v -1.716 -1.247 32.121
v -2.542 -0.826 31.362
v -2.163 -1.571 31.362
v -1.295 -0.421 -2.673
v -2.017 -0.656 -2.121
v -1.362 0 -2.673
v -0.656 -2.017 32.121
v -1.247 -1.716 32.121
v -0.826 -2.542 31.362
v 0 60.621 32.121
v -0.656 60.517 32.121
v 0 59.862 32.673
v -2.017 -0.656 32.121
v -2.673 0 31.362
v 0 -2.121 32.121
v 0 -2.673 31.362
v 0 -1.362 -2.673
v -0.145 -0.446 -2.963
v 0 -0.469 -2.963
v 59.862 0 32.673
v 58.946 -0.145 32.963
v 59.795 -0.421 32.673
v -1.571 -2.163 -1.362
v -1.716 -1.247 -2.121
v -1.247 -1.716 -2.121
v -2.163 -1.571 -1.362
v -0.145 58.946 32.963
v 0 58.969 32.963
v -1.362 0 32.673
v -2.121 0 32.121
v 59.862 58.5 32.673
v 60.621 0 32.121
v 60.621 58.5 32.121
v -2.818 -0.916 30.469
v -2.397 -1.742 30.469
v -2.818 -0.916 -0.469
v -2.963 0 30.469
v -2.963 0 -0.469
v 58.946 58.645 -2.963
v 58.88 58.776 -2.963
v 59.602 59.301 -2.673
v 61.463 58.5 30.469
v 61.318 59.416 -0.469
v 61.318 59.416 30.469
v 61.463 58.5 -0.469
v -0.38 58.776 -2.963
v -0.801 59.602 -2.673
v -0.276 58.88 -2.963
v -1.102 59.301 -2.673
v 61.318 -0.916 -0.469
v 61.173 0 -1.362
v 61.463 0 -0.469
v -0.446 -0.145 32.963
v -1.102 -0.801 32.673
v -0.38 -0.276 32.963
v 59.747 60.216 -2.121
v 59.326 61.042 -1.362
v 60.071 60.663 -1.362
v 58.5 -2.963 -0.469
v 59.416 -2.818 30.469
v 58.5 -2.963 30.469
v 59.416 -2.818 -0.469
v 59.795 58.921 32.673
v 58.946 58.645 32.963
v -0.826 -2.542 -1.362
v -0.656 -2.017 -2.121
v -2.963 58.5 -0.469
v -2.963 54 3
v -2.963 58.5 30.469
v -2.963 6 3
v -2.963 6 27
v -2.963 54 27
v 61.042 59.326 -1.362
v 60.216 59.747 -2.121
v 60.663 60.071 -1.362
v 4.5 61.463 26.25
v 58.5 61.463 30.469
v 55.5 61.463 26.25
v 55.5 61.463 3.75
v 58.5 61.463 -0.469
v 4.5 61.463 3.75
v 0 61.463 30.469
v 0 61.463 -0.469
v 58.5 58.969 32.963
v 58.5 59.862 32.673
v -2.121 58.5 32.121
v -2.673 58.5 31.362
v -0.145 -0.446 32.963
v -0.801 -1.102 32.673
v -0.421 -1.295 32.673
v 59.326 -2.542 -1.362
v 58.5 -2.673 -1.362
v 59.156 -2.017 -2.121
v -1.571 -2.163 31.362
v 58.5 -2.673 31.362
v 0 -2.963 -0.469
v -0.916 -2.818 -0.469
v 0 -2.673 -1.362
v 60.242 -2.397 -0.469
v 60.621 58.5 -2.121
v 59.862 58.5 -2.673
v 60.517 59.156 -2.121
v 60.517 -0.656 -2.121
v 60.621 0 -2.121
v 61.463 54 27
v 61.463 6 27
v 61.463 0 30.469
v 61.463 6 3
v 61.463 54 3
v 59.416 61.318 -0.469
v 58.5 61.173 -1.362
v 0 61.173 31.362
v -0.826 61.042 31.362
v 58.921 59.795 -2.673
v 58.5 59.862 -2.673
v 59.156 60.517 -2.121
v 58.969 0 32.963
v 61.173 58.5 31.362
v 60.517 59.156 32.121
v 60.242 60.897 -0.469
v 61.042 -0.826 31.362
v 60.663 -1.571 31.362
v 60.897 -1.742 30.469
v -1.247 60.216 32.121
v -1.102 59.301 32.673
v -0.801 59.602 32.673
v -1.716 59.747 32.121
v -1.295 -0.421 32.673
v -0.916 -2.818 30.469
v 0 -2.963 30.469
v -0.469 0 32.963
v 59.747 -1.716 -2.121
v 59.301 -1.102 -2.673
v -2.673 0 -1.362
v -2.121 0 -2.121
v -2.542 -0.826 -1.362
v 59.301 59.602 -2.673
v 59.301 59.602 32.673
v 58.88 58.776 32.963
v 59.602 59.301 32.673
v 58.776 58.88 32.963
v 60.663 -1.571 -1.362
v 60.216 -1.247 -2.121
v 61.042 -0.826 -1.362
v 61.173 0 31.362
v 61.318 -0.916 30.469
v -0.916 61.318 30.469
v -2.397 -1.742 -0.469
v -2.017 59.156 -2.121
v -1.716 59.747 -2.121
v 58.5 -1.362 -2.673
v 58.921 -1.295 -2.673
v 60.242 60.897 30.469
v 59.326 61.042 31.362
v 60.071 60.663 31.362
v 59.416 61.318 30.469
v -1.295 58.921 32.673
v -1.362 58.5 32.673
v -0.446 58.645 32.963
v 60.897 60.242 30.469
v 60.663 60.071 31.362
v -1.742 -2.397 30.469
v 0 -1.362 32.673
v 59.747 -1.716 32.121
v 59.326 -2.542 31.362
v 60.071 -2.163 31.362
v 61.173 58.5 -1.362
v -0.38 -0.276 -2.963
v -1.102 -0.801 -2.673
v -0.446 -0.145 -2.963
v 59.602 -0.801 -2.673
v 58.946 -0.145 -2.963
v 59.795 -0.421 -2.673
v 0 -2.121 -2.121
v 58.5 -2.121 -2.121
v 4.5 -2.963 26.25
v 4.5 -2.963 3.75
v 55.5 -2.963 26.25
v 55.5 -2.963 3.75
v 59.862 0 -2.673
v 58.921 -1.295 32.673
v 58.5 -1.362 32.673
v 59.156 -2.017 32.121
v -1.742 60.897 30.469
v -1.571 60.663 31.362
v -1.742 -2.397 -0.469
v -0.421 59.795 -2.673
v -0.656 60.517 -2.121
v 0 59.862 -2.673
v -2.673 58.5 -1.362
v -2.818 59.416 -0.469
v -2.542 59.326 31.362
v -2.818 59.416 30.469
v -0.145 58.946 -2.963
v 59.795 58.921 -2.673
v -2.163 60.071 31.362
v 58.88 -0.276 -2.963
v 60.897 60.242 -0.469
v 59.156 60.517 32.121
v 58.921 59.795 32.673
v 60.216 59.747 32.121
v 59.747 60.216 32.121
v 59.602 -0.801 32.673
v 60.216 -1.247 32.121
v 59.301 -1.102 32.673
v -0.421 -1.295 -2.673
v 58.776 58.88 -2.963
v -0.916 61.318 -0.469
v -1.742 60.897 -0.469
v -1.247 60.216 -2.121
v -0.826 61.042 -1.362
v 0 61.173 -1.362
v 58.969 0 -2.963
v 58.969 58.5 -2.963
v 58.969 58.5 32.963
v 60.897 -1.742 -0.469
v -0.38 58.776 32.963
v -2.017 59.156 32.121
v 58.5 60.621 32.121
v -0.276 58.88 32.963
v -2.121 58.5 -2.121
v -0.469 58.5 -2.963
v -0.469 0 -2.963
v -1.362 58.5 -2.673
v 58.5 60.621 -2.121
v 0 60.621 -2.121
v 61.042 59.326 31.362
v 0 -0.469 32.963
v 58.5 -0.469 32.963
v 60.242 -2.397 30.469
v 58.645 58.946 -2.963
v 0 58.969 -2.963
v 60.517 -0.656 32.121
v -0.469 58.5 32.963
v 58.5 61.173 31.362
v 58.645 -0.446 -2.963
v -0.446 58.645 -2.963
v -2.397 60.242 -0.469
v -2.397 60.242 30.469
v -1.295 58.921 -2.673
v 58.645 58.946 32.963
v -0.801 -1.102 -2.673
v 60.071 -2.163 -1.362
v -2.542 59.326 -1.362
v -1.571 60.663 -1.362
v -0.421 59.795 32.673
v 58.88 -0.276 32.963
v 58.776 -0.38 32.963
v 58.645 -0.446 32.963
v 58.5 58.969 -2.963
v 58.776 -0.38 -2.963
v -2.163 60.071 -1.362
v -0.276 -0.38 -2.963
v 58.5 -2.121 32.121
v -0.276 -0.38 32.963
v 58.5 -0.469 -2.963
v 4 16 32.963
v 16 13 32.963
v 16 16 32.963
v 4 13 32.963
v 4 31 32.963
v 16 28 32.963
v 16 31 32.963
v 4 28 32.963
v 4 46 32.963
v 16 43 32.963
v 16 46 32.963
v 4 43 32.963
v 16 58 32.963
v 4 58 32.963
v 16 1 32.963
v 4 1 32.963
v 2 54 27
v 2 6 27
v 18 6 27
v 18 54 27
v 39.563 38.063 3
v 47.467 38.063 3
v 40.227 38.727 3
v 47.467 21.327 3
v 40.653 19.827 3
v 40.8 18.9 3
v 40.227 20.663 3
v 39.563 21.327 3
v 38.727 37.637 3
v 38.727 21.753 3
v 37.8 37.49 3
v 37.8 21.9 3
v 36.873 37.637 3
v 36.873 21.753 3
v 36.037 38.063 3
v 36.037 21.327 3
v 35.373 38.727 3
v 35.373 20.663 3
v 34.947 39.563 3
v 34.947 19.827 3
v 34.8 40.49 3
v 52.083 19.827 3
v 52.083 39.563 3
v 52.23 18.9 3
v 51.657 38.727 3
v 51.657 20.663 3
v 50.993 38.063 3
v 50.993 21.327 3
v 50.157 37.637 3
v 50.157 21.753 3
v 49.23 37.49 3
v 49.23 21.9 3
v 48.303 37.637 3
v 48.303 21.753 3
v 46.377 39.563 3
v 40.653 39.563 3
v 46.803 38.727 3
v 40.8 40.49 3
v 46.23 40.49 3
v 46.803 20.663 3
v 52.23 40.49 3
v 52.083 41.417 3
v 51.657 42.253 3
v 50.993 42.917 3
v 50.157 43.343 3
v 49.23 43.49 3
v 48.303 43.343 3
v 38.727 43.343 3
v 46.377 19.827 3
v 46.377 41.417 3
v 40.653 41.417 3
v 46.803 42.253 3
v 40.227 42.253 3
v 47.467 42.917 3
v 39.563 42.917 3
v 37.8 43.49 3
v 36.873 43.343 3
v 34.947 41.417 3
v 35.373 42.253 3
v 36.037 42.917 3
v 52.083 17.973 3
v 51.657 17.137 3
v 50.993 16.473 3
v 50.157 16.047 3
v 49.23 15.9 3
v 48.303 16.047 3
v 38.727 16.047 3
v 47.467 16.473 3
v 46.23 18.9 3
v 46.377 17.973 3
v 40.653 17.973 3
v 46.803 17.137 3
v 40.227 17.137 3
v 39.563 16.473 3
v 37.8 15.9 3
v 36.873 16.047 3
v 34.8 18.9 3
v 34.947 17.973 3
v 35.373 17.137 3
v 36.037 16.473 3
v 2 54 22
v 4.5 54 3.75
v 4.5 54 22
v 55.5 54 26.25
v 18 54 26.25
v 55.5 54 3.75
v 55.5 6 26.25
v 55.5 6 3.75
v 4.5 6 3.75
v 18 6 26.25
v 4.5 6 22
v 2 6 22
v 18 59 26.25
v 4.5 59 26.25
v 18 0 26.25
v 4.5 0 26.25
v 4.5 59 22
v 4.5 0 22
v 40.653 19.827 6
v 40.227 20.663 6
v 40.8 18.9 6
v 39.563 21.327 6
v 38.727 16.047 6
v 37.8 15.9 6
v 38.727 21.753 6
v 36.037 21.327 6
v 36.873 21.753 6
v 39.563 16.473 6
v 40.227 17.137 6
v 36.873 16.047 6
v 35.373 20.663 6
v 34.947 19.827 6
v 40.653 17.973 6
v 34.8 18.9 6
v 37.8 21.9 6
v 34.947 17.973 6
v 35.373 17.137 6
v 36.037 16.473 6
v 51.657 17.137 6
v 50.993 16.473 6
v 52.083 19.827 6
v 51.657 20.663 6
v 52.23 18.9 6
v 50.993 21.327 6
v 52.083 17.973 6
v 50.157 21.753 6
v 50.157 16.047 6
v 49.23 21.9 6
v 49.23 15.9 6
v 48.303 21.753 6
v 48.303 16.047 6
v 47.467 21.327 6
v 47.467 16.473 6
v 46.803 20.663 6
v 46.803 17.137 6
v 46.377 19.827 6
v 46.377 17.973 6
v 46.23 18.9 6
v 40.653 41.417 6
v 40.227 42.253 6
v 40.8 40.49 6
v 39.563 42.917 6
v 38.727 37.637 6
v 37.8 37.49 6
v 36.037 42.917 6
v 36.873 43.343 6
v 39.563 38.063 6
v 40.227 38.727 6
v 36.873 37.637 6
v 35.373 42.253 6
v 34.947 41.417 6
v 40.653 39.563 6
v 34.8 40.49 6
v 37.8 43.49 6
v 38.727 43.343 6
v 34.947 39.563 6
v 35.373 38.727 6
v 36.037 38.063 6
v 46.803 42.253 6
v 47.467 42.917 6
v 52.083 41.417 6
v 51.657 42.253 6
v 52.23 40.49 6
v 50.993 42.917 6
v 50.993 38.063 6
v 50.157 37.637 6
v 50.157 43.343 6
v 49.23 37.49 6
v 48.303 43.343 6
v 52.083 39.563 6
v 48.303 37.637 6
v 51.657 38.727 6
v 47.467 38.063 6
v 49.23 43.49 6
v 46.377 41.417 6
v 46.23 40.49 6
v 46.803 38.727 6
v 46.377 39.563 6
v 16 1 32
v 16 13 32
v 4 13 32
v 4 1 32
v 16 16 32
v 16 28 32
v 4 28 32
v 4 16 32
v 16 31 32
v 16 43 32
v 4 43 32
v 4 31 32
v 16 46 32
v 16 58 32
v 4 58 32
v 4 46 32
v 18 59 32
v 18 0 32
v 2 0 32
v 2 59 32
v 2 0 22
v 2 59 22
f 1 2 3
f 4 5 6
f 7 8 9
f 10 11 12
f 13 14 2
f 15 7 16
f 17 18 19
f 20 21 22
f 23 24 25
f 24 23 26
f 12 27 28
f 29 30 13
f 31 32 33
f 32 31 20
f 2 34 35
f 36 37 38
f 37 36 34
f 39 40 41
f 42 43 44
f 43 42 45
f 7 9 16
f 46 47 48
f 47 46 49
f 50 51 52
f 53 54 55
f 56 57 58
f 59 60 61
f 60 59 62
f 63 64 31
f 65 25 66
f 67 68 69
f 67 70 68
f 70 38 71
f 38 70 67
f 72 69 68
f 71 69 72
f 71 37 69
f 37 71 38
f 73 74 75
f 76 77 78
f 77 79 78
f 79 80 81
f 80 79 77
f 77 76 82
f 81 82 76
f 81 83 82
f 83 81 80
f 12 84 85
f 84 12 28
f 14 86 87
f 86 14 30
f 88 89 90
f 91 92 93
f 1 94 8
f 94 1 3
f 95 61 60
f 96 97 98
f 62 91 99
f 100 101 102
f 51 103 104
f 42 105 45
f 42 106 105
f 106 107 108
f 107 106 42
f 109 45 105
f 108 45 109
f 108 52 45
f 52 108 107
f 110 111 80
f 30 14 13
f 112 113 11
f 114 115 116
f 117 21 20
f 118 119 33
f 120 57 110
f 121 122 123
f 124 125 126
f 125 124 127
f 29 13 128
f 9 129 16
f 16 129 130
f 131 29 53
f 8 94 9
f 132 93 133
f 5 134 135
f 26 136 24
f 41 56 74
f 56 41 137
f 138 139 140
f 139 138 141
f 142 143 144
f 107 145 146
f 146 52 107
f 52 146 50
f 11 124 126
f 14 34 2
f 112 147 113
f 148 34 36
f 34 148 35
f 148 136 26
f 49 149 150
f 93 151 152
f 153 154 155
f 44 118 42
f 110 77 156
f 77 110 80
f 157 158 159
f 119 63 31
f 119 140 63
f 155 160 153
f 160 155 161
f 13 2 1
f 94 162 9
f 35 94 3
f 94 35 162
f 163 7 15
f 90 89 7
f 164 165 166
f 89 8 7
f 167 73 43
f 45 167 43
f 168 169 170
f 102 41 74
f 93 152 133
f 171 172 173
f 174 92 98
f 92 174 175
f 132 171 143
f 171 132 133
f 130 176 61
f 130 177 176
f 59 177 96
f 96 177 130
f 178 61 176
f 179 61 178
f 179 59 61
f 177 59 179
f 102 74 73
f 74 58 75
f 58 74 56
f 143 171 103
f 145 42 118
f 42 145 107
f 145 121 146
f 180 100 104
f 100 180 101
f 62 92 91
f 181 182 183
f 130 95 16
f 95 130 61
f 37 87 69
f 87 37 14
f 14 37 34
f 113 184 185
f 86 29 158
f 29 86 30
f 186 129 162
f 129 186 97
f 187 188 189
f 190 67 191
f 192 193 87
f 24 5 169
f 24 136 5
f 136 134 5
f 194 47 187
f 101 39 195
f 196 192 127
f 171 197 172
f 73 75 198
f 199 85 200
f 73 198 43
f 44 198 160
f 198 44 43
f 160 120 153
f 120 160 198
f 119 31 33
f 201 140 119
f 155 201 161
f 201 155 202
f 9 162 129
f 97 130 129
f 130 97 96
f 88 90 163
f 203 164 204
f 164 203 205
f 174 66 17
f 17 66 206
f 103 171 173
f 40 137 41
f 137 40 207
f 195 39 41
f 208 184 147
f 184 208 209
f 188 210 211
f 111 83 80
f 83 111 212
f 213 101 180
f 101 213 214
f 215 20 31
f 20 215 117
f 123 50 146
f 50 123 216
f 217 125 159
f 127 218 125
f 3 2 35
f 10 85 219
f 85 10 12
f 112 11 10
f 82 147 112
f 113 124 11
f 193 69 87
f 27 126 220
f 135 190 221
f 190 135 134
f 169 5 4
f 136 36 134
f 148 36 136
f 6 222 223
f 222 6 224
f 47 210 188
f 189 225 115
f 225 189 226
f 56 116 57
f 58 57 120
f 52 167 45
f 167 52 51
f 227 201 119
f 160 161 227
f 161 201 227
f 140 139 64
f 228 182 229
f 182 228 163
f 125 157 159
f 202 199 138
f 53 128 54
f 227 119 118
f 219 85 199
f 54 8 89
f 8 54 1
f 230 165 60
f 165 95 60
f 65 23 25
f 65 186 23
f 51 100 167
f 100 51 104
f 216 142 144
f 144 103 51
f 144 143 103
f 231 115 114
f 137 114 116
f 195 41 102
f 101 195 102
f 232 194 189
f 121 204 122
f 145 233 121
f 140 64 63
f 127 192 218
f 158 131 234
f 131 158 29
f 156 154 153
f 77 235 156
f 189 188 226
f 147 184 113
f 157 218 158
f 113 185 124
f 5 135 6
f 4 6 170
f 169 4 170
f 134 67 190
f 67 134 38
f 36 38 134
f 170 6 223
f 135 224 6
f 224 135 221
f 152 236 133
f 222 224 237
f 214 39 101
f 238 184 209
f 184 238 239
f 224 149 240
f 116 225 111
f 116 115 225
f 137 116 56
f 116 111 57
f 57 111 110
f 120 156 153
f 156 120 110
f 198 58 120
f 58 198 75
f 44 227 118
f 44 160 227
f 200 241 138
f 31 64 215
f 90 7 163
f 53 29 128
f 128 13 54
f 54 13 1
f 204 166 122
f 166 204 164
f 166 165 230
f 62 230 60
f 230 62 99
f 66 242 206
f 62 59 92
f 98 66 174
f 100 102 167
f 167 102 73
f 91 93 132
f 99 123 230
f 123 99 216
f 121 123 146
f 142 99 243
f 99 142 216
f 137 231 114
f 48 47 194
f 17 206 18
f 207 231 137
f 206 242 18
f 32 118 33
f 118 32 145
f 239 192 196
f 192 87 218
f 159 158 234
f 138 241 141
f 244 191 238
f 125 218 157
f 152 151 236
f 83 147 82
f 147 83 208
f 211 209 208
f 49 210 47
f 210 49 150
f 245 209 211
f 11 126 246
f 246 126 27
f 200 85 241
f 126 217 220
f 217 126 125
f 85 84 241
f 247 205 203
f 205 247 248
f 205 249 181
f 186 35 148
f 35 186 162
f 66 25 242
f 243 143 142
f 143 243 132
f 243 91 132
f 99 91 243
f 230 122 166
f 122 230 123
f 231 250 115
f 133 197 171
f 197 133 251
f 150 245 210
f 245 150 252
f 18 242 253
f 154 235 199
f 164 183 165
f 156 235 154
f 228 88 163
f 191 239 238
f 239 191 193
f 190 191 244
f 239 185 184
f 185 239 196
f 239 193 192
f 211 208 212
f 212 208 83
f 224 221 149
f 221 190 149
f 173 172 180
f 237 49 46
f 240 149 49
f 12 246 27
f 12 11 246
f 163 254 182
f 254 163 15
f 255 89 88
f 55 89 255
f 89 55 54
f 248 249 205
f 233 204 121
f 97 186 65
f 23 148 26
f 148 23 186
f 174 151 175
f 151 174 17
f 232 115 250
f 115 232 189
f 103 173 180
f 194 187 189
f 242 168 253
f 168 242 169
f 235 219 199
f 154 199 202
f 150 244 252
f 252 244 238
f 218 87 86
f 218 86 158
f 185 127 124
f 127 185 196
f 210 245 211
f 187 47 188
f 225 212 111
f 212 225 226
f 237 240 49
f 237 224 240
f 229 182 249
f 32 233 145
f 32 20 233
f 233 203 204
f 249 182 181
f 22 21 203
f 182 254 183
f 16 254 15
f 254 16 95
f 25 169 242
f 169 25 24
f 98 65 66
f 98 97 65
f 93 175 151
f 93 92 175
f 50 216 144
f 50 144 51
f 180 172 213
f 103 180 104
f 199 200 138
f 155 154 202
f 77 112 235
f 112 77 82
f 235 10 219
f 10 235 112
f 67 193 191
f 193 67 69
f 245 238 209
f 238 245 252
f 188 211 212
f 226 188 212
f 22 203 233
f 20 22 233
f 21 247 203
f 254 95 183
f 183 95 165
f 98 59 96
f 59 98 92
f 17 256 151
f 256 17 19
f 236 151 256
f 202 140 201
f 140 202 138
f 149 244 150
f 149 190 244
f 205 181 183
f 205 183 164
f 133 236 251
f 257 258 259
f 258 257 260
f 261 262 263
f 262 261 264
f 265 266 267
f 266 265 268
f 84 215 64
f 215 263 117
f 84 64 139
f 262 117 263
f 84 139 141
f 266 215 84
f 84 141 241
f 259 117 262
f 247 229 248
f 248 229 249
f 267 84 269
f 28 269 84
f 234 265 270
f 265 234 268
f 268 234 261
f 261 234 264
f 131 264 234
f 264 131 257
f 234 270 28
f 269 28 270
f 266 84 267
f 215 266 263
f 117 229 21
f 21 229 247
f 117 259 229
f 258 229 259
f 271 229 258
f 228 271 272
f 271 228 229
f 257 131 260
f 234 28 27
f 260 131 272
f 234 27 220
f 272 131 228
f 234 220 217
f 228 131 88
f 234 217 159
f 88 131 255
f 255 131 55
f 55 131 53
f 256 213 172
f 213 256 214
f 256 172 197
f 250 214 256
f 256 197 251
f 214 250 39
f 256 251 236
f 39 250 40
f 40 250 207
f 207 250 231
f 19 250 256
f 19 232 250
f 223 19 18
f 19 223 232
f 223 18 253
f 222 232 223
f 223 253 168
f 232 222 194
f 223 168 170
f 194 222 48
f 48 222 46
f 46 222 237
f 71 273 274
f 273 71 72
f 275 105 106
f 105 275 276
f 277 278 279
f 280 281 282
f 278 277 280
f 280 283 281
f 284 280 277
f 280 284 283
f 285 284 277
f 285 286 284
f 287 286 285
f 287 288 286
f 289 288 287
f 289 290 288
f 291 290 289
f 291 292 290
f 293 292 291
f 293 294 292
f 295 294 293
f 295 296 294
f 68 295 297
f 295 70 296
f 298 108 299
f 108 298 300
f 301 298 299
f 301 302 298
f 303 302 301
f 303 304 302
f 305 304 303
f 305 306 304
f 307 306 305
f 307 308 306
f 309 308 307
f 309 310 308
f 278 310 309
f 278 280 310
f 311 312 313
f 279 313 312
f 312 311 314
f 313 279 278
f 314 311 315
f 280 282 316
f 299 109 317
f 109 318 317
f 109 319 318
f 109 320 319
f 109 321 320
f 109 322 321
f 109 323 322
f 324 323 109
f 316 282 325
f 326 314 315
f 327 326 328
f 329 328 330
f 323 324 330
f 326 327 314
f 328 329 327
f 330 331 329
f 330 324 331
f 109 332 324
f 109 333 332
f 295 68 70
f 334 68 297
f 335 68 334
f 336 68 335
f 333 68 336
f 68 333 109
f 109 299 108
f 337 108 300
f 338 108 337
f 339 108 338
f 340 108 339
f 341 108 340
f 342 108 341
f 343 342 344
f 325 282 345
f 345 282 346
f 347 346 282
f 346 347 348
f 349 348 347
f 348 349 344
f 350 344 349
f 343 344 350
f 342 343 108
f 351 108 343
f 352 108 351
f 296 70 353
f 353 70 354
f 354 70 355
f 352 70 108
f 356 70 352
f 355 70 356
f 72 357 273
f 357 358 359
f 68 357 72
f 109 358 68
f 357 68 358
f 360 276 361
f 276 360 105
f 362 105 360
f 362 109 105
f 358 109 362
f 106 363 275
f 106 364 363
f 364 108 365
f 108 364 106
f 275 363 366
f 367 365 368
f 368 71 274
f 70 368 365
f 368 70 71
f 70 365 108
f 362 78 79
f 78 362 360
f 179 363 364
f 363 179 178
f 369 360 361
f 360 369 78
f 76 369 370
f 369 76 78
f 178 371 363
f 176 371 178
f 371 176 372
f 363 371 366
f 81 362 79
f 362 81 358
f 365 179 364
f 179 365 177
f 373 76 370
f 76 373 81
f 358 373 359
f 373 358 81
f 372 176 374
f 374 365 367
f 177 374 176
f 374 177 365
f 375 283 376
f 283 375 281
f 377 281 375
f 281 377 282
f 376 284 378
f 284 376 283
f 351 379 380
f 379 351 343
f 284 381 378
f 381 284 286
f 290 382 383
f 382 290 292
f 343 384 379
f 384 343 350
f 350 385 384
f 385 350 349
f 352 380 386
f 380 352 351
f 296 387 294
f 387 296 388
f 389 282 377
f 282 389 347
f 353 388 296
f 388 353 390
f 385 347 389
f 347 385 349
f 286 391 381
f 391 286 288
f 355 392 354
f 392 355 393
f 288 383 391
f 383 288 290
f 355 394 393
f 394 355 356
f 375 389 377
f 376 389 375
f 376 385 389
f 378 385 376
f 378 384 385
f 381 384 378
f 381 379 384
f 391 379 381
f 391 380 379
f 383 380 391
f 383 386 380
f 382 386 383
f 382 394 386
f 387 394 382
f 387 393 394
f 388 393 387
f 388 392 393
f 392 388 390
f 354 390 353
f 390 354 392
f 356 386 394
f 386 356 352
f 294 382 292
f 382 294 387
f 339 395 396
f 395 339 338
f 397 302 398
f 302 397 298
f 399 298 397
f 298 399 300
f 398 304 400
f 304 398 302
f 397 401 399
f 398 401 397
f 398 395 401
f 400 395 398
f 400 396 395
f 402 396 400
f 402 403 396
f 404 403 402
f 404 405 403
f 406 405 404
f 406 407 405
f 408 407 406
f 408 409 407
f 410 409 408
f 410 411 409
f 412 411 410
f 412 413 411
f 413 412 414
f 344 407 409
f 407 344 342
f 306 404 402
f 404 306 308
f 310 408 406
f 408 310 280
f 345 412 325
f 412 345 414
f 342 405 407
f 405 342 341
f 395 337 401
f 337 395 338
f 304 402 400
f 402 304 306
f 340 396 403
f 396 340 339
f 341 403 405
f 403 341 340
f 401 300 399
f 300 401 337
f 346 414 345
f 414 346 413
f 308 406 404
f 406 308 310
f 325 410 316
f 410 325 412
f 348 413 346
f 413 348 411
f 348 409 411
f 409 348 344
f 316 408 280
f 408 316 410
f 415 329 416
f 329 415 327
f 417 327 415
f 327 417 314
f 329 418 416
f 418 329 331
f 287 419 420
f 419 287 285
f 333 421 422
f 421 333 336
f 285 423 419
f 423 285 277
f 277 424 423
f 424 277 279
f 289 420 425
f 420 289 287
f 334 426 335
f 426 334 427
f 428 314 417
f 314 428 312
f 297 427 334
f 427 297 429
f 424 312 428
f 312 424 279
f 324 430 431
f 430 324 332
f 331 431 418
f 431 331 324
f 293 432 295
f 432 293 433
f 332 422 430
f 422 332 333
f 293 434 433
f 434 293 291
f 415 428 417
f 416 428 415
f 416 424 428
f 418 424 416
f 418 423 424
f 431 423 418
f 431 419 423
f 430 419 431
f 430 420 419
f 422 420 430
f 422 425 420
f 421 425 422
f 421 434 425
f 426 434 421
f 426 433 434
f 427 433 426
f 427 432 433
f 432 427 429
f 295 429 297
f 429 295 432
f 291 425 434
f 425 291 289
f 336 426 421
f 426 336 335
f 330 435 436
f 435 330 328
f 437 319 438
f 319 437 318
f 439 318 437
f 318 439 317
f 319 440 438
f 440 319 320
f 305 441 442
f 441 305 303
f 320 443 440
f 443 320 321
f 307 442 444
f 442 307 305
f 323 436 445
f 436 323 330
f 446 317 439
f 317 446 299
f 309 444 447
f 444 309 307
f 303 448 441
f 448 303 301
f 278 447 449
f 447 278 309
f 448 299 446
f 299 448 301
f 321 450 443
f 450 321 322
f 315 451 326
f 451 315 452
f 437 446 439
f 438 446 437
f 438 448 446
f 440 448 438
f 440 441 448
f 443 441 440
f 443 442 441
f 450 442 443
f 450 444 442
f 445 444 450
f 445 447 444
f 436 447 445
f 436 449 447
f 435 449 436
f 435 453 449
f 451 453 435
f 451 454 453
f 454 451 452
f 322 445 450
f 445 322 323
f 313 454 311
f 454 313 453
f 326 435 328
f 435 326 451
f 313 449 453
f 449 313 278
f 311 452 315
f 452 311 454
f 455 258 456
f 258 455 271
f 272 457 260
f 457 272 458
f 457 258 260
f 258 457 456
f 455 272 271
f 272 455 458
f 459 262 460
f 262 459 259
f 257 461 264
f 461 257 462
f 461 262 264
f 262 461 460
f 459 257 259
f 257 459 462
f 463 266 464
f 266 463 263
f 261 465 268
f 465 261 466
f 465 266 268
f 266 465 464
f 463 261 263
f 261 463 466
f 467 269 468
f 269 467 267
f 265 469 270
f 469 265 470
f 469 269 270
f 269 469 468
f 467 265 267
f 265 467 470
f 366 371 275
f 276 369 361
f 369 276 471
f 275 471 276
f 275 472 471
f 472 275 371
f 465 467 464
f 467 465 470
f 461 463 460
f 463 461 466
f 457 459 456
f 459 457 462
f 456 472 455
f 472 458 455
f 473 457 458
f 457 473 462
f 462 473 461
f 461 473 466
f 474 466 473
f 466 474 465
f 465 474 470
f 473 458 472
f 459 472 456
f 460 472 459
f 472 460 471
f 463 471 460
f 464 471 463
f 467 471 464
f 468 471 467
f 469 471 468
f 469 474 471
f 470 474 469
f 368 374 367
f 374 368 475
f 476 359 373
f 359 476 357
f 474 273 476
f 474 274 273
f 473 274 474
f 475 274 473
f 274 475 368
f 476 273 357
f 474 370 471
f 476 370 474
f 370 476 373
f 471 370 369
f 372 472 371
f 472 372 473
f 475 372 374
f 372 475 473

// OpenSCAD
// file: ../../../../../../basics/rounded-edges/rounded-cube/rounded-cube.scad
/**
 *
 *  some parts of this software were inspired by
 *
 * 	     http://www.thingiverse.com/thing:9347
 *
 */

/**
 * makes a rounded cube
 */
module roundedCube(cornerRadius=4,
				   cubeCentered=false,
				   sides=30,
				   sidesOnly=false,
				   size=[20,20,2])
{
    $fn=sides;

    x = size[0] - cornerRadius/2;
    y = size[1] - cornerRadius/2;
    z = size[2];

    minkowski(size, cornerRadius)
    {
        cube(size=[x,y,z], center=cubeCentered);

        if(sidesOnly)
        {
            cylinder(r=cornerRadius);
        }
        else
        {
            sphere(r=cornerRadius);
        }
    };
}
// file: ../../../../switch-mounting-holes/keyboard-switch-mounting-holes.scad
/**
 * buttonSide - the length of the side of the rectangular cutout for the button/key
 */
module keyboardSwitchMountingHoles(buttonCount = 4,
			 buttonSide = 5,
		 	 panelHeight = 1)
{
	x = 16;
	startY = 0;

	ySpacing = 3;
	yIncrement = buttonSide + ySpacing;

	for(i = [0 : buttonCount-1])
	{
		y = startY + (i * yIncrement);

		zLength = 2 * panelHeight + 0.2;

		color("green")
		translate([x, y, -0.1])
		cube([buttonSide, buttonSide, zLength]);
	}
}
// file: ../../../../../../microcontrollers/adafruit/trinket-mini/mounting-standoffs/trinket-mini-mounting-standoffs.scad
function xHoleDeltaBottomRight() = 11.43;

function yHoleDelta() = 21.59;

module trinketMiniStandoffs()
{
    radius = 3;
    height = 4;
    sides = 20;
    
    // this is the 'bottom left' standoff; it is on the reset button end of the Trinket Mini
    cylinder(r=radius, h = height, $fn=sides);
    
    // this is the 'bottom right' standoff; it is on the reset button end    
    translate([xHoleDeltaBottomRight(),0,0])
    cylinder(r=radius, h = height, $fn=sides);
    
    // this is the 'top left standoff; it is on the power/USB end of the Trinket Mini    
    translate([0, yHoleDelta(),0])
    cylinder(r=radius, h = height, $fn=sides);
    
    // this is the 'top right standoff; it is on the power/USB end of the Trinket Mini
    translate([xHoleDeltaBottomRight(), yHoleDelta() ,0])
    cylinder(r=radius, h = height, $fn=sides);
}
// file: ../../../../../../basics/rounded-edges/rounded-cube-enclosure/rounded-cube-enclosure.scad
use <../rounded-cube/rounded-cube.scad>

module roundedCubeEnclosure(boardLengthX,
					 		boardLengthY,
					 		boardLengthZ,
							cornerRadius,
							xAxisCutout_yPercentage,
							xAxisCutout_zPercentage,
							yAxisCutout_xPercentage,
							yAxisCutout_zPercentage)
{
	size = [boardLengthX, boardLengthY, boardLengthZ];

	difference()
	{
		roundedCube(cornerRadius = cornerRadius,
					size=size,
		            sides=5,
		            sides=20);

		// x axis cutout
		xAxisCutout_xLength = boardLengthX * 1.2;
		xAxisCutout_yLength = boardLengthY * xAxisCutout_yPercentage;
		xAxisCutout_zLength = boardLengthZ * xAxisCutout_zPercentage;
		xAxisCutout_xTranslate = -0.09 * boardLengthX;
		xAxisCutout_yTranslate = boardLengthY / 2.0 - xAxisCutout_yLength / 2.0;
		xAxisCutout_zTranslate = boardLengthZ / 2.0 - xAxisCutout_zLength / 2.0;
		color("blue")
		translate([xAxisCutout_xTranslate,
				   xAxisCutout_yTranslate,
				   xAxisCutout_zTranslate])
		cube([xAxisCutout_xLength,
			  xAxisCutout_yLength,
			  xAxisCutout_zLength]);

	  	// y axis cutout
		yAxisCutout_xLength = boardLengthX * yAxisCutout_xPercentage;
		yAxisCutout_yLength = boardLengthY * 1.2;
		yAxisCutout_zLength = boardLengthZ * yAxisCutout_zPercentage;
		yAxisCutout_xTranslate = boardLengthX / 2.0 - yAxisCutout_xLength / 2.0;
		yAxisCutout_yTranslate = boardLengthY / 2.0 - yAxisCutout_yLength / 2.0;
		yAxisCutout_zTranslate = boardLengthZ / 2.0 - yAxisCutout_zLength / 2.0;
		color("green")
		translate([yAxisCutout_xTranslate,
				   yAxisCutout_yTranslate,
				   yAxisCutout_zTranslate])
		cube([yAxisCutout_xLength,
			  yAxisCutout_yLength,
			  yAxisCutout_zLength]);
	}
}
// main file
    
use <../../../../../../basics/rounded-edges/rounded-cube-enclosure/rounded-cube-enclosure.scad>

use <../../../../../../microcontrollers/adafruit/trinket-mini/mounting-standoffs/trinket-mini-mounting-standoffs.scad>

use <../../../../../../electronics/keyboards/switch-mounting-holes/keyboard-switch-mounting-holes.scad>

trinketMiniShortcutKeyboard();

module frameWithTrinketMounts(boardLengthZ, cornerRadius)
{
	union()
	{
		boardLengthX = 60;
		boardLengthY = 60;

		roundedCubeEnclosure(boardLengthX = boardLengthX,
                                    boardLengthY = boardLengthY,
                                    boardLengthZ = boardLengthZ,
                                    cornerRadius = cornerRadius,
                                    xAxisCutout_yPercentage = 0.8,
                                    xAxisCutout_zPercentage = 0.8,
                                    yAxisCutout_xPercentage = 0.85,
                                    yAxisCutout_zPercentage = 0.75);

		xTranslate = (boardLengthX + cornerRadius) * 0.6;
		yTranslate = (boardLengthY + cornerRadius) * 0.3;
		zTranslate = 2;

		color("red")
		translate([xTranslate, yTranslate, zTranslate])
		trinketMiniStandoffs();
	}
}

module trinketMiniShortcutKeyboard()
{
	boardLengthZ = 30;
	buttonSide = 12;
	cornerRadius = 3;

	difference()
	{
		frameWithTrinketMounts(boardLengthZ, cornerRadius);

		xTranslate = -12;
		yTranslate = 1;
		zTranslate = boardLengthZ * 0.8;
		translate([xTranslate, yTranslate, zTranslate])
		keyboardSwitchMountingHoles(buttonCount = 4,
					 buttonSide = buttonSide,
				 	 panelHeight = 5);

		 panelCutout_xLength = buttonSide + 4;
		 panelCutout_yLength = (panelCutout_xLength * 4) - 5;
		 panelCutout_zLength = 10;
		 panelCutout_xTranslate = 2;
		 panelCutout_yTranslate = 0;
		 panelCutout_zTranslate = (boardLengthZ + cornerRadius) - panelCutout_zLength - 1;  // the minus 1 is for the panel mount height
		 color("pink")
		 translate([panelCutout_xTranslate, panelCutout_yTranslate, panelCutout_zTranslate])
		 cube([panelCutout_xLength, panelCutout_yLength, panelCutout_zLength]);
	}
}
